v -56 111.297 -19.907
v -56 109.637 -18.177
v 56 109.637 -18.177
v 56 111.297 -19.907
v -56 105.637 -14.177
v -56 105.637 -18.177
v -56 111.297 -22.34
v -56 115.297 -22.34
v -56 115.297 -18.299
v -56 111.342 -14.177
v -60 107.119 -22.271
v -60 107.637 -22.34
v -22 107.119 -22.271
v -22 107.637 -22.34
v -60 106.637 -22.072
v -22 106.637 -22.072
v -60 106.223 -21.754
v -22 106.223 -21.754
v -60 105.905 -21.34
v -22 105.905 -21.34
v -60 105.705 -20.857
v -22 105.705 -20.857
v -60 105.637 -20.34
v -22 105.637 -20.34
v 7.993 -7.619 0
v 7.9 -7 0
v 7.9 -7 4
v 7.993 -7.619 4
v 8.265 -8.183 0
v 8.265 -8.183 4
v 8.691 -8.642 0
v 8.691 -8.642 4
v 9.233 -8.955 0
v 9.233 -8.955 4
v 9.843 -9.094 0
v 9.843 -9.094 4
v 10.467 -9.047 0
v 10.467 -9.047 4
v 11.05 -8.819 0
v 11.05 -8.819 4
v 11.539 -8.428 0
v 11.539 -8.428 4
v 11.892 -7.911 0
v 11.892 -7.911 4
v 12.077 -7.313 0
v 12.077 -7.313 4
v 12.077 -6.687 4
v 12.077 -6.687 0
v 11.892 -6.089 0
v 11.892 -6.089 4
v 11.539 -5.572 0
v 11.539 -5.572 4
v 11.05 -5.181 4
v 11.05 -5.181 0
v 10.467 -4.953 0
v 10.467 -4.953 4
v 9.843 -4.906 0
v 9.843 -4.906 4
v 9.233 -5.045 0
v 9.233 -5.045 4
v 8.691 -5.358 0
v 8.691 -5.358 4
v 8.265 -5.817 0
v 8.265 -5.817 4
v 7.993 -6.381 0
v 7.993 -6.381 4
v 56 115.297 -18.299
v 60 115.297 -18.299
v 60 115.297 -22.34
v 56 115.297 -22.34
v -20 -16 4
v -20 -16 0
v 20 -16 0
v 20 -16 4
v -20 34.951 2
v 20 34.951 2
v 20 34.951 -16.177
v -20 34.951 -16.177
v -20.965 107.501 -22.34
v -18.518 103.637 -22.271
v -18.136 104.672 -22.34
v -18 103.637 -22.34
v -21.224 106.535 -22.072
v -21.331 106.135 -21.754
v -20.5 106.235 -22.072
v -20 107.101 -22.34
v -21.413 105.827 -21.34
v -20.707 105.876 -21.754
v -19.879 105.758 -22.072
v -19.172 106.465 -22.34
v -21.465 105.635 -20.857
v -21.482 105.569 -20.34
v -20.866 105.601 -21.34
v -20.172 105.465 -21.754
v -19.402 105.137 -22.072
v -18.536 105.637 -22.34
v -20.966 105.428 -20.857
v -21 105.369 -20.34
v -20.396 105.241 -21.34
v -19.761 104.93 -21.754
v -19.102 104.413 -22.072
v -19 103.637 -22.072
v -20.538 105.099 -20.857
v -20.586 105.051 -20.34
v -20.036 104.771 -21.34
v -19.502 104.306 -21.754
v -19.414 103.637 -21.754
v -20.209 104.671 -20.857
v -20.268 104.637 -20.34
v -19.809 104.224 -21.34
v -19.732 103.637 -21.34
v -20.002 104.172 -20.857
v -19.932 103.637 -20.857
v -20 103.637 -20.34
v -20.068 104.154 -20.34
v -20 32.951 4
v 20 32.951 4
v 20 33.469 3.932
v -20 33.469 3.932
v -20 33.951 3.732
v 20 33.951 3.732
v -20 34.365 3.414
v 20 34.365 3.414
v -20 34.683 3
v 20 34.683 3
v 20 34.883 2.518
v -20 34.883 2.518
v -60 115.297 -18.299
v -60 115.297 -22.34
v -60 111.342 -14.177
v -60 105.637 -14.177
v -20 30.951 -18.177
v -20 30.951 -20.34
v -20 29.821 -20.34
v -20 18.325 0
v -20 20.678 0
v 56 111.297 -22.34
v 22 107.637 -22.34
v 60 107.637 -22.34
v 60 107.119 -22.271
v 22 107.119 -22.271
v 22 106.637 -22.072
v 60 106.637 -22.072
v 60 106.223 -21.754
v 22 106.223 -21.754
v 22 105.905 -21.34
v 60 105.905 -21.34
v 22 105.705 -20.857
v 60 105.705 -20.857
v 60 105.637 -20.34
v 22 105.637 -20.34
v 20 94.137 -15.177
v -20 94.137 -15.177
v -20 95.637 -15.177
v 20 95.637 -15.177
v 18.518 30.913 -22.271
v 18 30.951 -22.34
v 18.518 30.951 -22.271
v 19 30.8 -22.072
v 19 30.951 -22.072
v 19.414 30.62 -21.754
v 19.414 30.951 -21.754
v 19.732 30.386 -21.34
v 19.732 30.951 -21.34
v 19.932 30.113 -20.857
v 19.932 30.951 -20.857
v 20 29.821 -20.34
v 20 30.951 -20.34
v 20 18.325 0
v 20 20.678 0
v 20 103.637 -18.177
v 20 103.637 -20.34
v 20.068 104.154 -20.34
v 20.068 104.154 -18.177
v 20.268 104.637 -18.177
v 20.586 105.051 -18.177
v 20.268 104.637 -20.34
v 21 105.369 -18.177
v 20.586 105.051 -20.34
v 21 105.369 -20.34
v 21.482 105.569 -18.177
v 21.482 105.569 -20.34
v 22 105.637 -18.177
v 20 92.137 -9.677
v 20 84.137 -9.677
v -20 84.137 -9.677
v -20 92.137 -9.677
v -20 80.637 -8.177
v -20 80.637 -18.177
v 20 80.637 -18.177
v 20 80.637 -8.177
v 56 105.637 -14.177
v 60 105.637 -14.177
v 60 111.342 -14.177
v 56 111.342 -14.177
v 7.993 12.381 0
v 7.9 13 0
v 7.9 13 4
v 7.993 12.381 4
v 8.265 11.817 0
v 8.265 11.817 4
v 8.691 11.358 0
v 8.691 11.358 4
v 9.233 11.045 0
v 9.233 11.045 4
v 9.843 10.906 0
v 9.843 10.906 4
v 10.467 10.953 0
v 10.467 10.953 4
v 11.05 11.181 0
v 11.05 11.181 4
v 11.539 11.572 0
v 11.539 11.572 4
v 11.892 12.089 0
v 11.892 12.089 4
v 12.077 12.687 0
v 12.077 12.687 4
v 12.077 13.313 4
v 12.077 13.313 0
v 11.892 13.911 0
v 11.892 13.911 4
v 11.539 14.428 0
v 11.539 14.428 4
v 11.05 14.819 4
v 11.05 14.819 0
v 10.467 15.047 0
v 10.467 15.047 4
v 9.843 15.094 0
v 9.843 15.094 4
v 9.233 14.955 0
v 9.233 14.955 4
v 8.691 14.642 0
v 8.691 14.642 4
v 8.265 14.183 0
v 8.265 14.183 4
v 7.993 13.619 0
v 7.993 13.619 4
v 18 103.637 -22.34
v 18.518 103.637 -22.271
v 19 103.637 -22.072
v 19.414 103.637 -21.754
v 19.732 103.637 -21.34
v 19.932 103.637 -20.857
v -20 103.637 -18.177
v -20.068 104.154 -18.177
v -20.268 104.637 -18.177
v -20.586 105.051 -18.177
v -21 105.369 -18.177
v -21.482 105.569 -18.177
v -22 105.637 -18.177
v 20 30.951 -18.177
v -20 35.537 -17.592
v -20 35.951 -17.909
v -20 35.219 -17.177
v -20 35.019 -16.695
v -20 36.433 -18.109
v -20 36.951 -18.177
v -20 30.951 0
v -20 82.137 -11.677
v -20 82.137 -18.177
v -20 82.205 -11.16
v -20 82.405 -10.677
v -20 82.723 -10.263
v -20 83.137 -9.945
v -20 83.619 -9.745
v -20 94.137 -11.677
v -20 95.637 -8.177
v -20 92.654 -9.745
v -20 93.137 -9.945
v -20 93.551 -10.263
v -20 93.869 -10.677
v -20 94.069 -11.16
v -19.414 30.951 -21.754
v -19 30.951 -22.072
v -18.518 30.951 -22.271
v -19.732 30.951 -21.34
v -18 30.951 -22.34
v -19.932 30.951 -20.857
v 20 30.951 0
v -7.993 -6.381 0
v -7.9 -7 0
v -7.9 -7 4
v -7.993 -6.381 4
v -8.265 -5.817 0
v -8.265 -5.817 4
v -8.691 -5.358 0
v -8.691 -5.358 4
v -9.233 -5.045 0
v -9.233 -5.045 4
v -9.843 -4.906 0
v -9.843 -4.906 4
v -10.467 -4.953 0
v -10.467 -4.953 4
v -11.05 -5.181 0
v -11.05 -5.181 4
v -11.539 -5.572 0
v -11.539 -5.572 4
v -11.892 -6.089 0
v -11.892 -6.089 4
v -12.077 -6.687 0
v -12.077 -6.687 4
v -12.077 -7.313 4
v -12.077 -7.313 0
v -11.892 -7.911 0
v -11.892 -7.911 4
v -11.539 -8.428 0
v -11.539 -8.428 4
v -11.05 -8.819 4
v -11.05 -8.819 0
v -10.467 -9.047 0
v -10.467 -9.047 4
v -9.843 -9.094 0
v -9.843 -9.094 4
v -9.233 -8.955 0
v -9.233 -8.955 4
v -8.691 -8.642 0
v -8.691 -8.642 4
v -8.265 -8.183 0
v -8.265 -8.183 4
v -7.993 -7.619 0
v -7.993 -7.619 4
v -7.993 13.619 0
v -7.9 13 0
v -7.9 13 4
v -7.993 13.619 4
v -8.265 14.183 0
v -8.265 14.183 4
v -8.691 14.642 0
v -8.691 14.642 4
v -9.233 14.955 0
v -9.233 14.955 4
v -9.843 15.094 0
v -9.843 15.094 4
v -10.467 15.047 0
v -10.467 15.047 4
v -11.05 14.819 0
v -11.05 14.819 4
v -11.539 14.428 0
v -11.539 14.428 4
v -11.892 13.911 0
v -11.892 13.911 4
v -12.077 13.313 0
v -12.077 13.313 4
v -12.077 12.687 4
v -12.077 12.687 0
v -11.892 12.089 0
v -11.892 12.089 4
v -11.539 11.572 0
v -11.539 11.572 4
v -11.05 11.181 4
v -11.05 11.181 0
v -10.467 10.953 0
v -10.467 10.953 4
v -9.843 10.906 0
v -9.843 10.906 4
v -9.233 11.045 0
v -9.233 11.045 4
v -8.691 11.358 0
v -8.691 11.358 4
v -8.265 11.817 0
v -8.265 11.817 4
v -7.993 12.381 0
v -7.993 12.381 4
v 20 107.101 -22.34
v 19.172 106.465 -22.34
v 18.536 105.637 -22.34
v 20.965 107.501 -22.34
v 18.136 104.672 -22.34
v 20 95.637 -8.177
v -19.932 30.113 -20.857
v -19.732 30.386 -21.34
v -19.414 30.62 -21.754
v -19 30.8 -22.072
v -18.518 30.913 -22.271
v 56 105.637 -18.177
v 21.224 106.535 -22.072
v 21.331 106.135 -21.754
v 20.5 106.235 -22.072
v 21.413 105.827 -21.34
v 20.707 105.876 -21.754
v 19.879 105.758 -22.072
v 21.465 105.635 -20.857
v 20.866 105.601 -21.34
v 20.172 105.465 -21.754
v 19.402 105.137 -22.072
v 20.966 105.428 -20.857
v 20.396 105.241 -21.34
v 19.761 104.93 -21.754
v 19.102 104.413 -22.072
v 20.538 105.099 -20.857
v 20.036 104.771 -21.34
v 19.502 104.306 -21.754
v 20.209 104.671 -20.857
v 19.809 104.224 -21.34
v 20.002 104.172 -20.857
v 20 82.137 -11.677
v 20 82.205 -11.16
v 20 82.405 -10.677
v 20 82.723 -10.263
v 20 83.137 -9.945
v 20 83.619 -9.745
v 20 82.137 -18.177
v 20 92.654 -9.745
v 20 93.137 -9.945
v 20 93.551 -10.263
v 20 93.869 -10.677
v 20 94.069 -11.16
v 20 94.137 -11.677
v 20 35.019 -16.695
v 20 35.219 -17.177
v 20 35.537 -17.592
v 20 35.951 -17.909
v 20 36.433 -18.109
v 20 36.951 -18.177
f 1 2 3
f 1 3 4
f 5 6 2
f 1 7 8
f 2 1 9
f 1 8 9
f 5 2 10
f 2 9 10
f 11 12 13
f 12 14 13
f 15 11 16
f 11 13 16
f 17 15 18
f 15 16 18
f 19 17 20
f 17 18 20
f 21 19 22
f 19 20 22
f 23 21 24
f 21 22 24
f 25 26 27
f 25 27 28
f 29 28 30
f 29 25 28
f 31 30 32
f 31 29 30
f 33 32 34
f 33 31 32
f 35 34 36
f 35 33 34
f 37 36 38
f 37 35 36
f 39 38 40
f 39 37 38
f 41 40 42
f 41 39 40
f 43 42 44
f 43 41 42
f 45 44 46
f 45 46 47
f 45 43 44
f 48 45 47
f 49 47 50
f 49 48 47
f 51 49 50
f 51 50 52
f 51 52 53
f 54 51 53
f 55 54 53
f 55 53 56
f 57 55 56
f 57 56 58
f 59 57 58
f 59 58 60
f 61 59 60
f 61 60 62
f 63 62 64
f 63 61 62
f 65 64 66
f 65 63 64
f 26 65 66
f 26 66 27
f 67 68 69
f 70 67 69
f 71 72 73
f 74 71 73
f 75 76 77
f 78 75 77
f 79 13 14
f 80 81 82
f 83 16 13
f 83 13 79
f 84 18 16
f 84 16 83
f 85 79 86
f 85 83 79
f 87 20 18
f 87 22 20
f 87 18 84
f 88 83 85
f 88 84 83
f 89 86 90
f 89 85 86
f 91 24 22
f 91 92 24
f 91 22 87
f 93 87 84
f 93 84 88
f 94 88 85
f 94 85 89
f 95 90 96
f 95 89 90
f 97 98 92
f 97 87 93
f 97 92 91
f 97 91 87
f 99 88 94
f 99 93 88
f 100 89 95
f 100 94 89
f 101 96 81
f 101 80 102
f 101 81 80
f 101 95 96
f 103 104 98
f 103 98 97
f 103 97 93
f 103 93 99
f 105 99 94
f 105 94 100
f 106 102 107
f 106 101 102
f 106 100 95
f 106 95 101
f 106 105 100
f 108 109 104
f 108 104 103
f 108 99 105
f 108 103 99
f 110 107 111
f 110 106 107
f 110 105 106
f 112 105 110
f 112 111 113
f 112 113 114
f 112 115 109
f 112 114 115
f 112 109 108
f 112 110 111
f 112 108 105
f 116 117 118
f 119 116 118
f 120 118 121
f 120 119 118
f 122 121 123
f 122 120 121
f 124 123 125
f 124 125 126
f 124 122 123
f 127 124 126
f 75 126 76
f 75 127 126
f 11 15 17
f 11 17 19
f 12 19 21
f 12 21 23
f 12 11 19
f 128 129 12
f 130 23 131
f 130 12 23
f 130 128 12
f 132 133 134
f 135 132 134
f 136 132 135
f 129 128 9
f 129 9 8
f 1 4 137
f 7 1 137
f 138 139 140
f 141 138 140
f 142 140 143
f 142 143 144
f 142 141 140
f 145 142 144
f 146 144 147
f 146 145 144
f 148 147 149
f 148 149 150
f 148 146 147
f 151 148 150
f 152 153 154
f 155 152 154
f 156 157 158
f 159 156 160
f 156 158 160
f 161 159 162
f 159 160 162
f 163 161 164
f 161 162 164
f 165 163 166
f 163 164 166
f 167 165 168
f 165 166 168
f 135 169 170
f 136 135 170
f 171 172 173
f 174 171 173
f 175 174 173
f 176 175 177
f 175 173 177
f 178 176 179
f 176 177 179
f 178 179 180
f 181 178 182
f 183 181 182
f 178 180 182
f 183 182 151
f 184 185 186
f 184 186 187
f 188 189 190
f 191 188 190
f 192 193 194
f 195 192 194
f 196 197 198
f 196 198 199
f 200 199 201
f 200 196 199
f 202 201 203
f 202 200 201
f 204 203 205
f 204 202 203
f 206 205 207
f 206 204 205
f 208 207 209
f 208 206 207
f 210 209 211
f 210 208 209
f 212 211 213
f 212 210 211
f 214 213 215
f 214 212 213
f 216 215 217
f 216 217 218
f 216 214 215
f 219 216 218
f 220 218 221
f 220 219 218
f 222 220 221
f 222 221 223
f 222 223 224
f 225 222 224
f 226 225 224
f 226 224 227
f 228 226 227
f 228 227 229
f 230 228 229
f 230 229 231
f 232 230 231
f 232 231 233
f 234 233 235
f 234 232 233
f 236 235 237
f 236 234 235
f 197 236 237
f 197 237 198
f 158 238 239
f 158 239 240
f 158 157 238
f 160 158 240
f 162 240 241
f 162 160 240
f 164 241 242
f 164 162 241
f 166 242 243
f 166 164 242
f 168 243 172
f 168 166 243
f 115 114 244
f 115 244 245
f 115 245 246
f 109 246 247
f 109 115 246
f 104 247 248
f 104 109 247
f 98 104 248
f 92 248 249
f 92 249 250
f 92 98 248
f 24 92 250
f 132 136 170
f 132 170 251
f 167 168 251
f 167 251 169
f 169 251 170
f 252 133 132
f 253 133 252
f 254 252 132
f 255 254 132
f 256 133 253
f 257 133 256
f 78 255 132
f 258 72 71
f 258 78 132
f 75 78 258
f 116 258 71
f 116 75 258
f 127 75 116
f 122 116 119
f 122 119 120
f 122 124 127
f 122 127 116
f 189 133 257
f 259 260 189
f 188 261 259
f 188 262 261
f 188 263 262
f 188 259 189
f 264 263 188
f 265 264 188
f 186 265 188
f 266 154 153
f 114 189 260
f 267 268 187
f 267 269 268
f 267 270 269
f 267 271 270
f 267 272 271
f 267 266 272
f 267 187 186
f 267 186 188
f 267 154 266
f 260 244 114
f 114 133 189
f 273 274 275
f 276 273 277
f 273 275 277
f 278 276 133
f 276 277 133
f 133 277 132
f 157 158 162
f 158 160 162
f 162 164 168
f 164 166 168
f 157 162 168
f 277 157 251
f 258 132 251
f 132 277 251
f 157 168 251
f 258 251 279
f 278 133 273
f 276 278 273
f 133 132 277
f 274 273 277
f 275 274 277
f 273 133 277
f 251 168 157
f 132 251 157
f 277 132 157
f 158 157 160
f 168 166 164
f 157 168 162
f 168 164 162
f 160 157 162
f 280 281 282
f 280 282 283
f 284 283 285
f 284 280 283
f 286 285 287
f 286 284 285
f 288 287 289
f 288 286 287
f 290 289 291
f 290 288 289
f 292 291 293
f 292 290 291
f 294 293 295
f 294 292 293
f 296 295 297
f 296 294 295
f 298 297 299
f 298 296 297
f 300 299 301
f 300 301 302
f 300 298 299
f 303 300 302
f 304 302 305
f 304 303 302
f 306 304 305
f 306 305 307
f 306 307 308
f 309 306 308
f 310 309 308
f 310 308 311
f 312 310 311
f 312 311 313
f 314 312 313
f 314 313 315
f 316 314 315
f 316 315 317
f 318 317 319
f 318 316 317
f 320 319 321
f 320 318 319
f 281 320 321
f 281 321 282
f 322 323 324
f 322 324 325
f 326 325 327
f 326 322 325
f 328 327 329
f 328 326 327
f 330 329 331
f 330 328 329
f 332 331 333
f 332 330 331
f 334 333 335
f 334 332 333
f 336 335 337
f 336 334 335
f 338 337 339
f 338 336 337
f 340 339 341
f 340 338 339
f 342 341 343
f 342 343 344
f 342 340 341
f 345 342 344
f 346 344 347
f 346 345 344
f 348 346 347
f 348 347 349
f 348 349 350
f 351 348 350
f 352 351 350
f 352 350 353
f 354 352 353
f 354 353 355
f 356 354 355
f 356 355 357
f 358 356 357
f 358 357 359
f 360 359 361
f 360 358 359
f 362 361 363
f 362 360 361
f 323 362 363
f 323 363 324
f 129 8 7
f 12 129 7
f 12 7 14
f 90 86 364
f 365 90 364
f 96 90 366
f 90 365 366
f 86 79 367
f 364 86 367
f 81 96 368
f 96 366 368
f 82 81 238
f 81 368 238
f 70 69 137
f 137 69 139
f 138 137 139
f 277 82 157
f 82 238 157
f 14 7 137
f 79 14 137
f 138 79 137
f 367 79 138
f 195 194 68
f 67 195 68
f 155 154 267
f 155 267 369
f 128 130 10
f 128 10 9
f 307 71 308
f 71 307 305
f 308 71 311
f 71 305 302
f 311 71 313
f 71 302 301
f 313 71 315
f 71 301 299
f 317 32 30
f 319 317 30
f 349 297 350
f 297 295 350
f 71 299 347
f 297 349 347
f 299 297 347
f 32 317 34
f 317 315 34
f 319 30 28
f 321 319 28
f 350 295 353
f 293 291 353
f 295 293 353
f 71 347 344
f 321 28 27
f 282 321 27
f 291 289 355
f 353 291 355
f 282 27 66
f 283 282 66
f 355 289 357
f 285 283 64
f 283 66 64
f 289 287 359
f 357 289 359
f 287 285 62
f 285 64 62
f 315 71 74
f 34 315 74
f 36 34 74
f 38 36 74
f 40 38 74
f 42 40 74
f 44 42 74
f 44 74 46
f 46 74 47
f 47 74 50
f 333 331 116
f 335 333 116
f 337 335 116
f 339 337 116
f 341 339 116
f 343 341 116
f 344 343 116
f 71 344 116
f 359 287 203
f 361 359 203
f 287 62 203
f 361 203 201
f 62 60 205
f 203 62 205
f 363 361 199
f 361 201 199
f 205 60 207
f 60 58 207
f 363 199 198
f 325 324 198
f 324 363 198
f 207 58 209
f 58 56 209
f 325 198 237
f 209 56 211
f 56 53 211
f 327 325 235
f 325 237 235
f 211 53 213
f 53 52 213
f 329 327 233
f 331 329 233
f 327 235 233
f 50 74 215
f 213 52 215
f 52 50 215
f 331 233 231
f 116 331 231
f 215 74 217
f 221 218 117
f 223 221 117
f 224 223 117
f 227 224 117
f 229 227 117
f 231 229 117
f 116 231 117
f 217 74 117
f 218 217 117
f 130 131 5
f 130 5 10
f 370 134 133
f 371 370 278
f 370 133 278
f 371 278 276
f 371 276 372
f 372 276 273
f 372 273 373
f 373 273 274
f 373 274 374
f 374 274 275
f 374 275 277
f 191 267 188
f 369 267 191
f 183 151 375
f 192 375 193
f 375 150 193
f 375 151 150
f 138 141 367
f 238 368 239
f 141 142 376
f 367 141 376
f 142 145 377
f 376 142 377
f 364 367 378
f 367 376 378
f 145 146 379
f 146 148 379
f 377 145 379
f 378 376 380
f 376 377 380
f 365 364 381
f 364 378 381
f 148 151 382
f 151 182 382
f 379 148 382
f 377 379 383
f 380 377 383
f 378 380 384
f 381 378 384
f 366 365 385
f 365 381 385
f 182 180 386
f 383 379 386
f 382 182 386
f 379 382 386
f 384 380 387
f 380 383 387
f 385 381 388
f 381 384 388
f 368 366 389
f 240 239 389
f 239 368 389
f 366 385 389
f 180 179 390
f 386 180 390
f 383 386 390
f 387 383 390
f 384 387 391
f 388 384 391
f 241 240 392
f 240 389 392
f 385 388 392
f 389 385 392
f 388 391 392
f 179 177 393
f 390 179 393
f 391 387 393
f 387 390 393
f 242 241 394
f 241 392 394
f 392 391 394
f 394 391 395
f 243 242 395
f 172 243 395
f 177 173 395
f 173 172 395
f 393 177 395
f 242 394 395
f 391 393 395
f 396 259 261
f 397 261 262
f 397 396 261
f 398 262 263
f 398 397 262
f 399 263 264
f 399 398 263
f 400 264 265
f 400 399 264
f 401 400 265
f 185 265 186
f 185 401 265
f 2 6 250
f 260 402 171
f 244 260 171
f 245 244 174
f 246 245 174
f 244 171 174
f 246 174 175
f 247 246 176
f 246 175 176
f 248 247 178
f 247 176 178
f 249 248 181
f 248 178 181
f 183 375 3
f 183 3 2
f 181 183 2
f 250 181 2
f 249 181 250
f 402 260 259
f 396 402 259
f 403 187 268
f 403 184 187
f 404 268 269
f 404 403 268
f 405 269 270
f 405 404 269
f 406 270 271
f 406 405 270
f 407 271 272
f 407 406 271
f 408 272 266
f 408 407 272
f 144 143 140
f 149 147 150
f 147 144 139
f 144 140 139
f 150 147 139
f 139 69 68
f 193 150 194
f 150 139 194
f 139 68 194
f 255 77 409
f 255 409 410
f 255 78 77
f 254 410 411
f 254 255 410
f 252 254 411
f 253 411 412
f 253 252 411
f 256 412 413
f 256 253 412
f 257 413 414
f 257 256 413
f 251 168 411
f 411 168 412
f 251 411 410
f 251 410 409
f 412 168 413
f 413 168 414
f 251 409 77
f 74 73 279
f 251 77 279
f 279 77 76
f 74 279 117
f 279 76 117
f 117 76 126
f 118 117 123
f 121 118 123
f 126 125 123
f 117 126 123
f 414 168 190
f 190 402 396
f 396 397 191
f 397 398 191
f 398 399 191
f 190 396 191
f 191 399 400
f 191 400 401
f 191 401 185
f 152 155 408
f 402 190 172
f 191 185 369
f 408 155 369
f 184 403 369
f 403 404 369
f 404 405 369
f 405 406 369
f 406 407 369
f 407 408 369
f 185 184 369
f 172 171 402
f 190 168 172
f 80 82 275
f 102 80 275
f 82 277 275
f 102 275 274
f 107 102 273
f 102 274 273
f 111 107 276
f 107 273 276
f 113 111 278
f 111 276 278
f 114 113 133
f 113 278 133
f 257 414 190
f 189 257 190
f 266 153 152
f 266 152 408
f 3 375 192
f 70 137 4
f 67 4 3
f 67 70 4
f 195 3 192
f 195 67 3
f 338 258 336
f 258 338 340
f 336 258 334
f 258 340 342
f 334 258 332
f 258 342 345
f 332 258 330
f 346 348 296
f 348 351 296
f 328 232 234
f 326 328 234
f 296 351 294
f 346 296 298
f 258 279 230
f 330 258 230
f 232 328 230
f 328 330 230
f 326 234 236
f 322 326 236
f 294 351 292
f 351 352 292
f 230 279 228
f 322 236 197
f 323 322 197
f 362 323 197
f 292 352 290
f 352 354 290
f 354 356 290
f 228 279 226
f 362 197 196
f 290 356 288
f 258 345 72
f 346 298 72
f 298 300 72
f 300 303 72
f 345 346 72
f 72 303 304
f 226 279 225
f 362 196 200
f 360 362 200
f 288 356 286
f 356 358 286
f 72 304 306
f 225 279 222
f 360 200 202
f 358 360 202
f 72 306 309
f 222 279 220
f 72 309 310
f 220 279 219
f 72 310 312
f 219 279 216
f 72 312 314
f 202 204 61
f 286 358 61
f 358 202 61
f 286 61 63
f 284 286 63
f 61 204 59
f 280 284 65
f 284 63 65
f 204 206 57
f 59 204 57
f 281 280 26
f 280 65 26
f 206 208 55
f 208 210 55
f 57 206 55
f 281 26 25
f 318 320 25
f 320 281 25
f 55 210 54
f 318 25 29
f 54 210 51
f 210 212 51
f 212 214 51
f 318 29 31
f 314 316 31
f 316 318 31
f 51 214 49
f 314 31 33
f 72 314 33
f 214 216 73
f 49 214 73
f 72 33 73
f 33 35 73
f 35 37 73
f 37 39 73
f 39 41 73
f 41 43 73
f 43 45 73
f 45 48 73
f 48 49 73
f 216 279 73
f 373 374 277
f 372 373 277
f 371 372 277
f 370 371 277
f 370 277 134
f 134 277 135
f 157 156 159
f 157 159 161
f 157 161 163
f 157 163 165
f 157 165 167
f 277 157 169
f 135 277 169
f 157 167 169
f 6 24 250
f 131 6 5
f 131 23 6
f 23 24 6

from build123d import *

# Parameters (mm, degrees)
SKETCH_1_W          = 40
SKETCH_1_H          = 35
SKETCH_1_R          = 2.1
EXTRUDE_1_DEPTH     = 4
EXTRUDE_2_DEPTH     = 40
SKETCH_4_W          = 40
SKETCH_4_H          = 4.162308774
EXTRUDE_3_DEPTH     = 56.94
CUT_EXTRUDE_1_DEPTH = 121.357980229
EXTRUDE_4_DEPTH     = 60
EXTRUDE_5_DEPTH     = 4
EXTRUDE_6_DEPTH     = 4
SKETCH_10_W         = 40
SKETCH_10_H         = 15
EXTRUDE_7_DEPTH     = 10
SKETCH_11_W         = 8.5
SKETCH_11_H         = 12
CUT_EXTRUDE_2_DEPTH = 143.100028239
SKETCH_12_W         = 3
SKETCH_12_H         = 1.5
CUT_EXTRUDE_3_DEPTH = 143.100028239
CUT_EXTRUDE_4_DEPTH = 143.100028239
CUT_EXTRUDE_5_DEPTH = 143.100028239
EXTRUDE_10_DEPTH    = 40
SKETCH_19_W         = 4.162308774
SKETCH_19_H         = 5.255395785
CUT_EXTRUDE_6_DEPTH = 143.100028239
EXTRUDE_11_DEPTH    = 40
FILLET_2_R          = 2
FILLET_3_R          = 2
FILLET_4_R          = 2
FILLET_5_R          = 2
CUT_EXTRUDE_7_DEPTH = 106.892734597
FILLET_6_R          = 2


with BuildPart() as part:
    # 草图1 → 凸台-拉伸1 (new body)
    with BuildSketch(Plane.XY):
        with Locations((0, 1.5)):
            Rectangle(SKETCH_1_W, SKETCH_1_H)
        with Locations((-10, 13)):
            Circle(SKETCH_1_R, mode=Mode.SUBTRACT)
        with Locations((-10, -7)):
            Circle(SKETCH_1_R, mode=Mode.SUBTRACT)
        with Locations(Location((10, -7, 0), (0, 0, 180))):
            Circle(SKETCH_1_R, mode=Mode.SUBTRACT)
        with Locations(Location((10, 13, 0), (0, 0, 180))):
            Circle(SKETCH_1_R, mode=Mode.SUBTRACT)
    extrude(amount=EXTRUDE_1_DEPTH)

    # 草图3 → 凸台-拉伸2 (add)
    with BuildSketch(Plane(origin=(20, 0, 0), x_dir=(0, 0, -1), z_dir=(1, 0, 0))):
        Polygon((0, 23.010957881), (-4, 23.010957881), (-4, 19), (0, 19), (22.339641279, 25.6956455), (22.339641279, 54.356827593), (18.177332505, 54.356827593), (18.177332505, 28.459074665), align=None)
    extrude(amount=-EXTRUDE_2_DEPTH)

    # 草图4 → 凸台-拉伸3 (add)
    with BuildSketch(Plane(origin=(0, 54.356827593, 0), x_dir=(1, 0, 0), z_dir=(0, 1, 0))):
        with Locations((0, 20.258486892)):
            Rectangle(SKETCH_4_W, SKETCH_4_H)
    extrude(amount=EXTRUDE_3_DEPTH)

    # 草图5 → 切除-拉伸1 (cut, through all)
    with BuildSketch(Plane(origin=(20, 0, 0), x_dir=(0, 0, -1), z_dir=(1, 0, 0))):
        Polygon((19.907332505, 111.296827593), (18.177332505, 109.636827593), (18.177332505, 111.296827593), align=None)
    extrude(amount=-CUT_EXTRUDE_1_DEPTH, mode=Mode.SUBTRACT)

    # 草图6 → 凸台-拉伸4 (add, symmetric)
    with BuildSketch(Plane(origin=(0, 0, 0), x_dir=(0, 0, -1), z_dir=(1, 0, 0))):
        Polygon((19.907332505, 111.296827593), (22.339641279, 111.296827593), (22.339641279, 105.636827593), (18.177332505, 105.636827593), (18.177332505, 109.636827593), align=None)
    extrude(amount=EXTRUDE_4_DEPTH, both=True)

    # 草图7 → 凸台-拉伸5 (add)
    with BuildSketch(Plane(origin=(60, 0, 0), x_dir=(0, 0, -1), z_dir=(1, 0, 0))):
        Polygon((22.339641279, 115.296827593), (22.339641279, 105.636827593), (14.177332505, 105.636827593), (14.177332505, 111.342267985), (18.29865065, 115.296827593), align=None)
    extrude(amount=-EXTRUDE_5_DEPTH)

    # 草图9 → 凸台-拉伸6 (add)
    with BuildSketch(Plane.ZY.offset(60)):
        Polygon((-22.339641279, 115.296827593), (-22.339641279, 105.636827593), (-14.177332505, 105.636827593), (-14.177332505, 111.342267985), (-18.29865065, 115.296827593), align=None)
    extrude(amount=-EXTRUDE_6_DEPTH)

    # 草图10 → 凸台-拉伸7 (add)
    with BuildSketch(Plane.XY.offset(-18.177332505)):
        with Locations((0, 88.136827593)):
            Rectangle(SKETCH_10_W, SKETCH_10_H)
    extrude(amount=EXTRUDE_7_DEPTH)

    # 草图11 → 切除-拉伸2 (cut, through all)
    with BuildSketch(Plane.ZY.offset(20)):
        with Locations((-13.927332505, 88.136827593)):
            Rectangle(SKETCH_11_W, SKETCH_11_H)
    extrude(amount=-CUT_EXTRUDE_2_DEPTH, mode=Mode.SUBTRACT)

    # 草图12 → 切除-拉伸3 (cut, through all)
    with BuildSketch(Plane.ZY.offset(20)):
        with Locations((-16.677332505, 94.886827593)):
            Rectangle(SKETCH_12_W, SKETCH_12_H)
    extrude(amount=-CUT_EXTRUDE_3_DEPTH, mode=Mode.SUBTRACT)

    # 草图13 → 切除-拉伸4 (cut, through all)
    with BuildSketch(Plane(origin=(20, 0, 0), x_dir=(0, 0, -1), z_dir=(1, 0, 0))):
        Polygon((0, 23.010957881), (0, 19), (18.177332505, 19), (18.177332505, 24.448116784), (18.177332505, 28.459074665), (0, 28.459074665), align=None)
    extrude(amount=-CUT_EXTRUDE_4_DEPTH, mode=Mode.SUBTRACT)


with BuildPart() as cut_extrude_4_piece_1:
    # of the separate pieces the step leaves, piece 1, a body of its own (cut_extrude_4_pieces)
    add(part.part.solids().sort_by_distance((-20, 24.448116784, -18.177332505))[0])

    # 草图14 → 切除-拉伸5 (cut, through all)
    with BuildSketch(Plane(origin=(20, 0, 0), x_dir=(0, 0, -1), z_dir=(1, 0, 0))):
        Polygon((22.339641279, 25.6956455), (18.177332505, 25.6956455), (18.177332505, 24.448116784), align=None)
    extrude(amount=-CUT_EXTRUDE_5_DEPTH, mode=Mode.SUBTRACT)



with BuildPart() as cut_extrude_4_piece_2:
    # of the separate pieces the step leaves, piece 2, a body of its own (cut_extrude_4_pieces)
    add(part.part.solids().sort_by_distance((-20, -16, 0))[0])


with BuildPart() as cut_extrude_4_piece_1_1:
    add(cut_extrude_4_piece_1.part)

    add(cut_extrude_4_piece_2.part)  # 凸台-拉伸10 merges 切除-拉伸4 piece 2
    # 草图18 → 凸台-拉伸10 (add)
    with BuildSketch(Plane(origin=(20, 0, 0), x_dir=(0, 0, -1), z_dir=(1, 0, 0))):
        Polygon((-4, 23.010957881), (-4, 34.951041285), (22.339641279, 34.951041285), (22.339641279, 30.951041285), (0, 30.951041285), (0, 23.010957881), align=None)
    extrude(amount=-EXTRUDE_10_DEPTH)

    # 草图19 → 切除-拉伸6 (cut, through all)
    with BuildSketch(Plane(origin=(20, 0, 0), x_dir=(0, 0, -1), z_dir=(1, 0, 0))):
        with Locations((20.258486892, 28.323343392)):
            Rectangle(SKETCH_19_W, SKETCH_19_H)
    extrude(amount=-CUT_EXTRUDE_6_DEPTH, mode=Mode.SUBTRACT)

    # 圆角2
    fillet_2_edges = [cut_extrude_4_piece_1_1.edges().sort_by_distance(p)[0] for p in [
        (0, 34.951041285, 4),
    ]]
    fillet(fillet_2_edges, radius=FILLET_2_R)

    # 圆角3
    fillet_3_edges = [cut_extrude_4_piece_1_1.edges().sort_by_distance(p)[0] for p in [
        (0, 34.951041285, -18.177332505),
    ]]
    fillet(fillet_3_edges, radius=FILLET_3_R)

    # 圆角4
    fillet_4_edges = [cut_extrude_4_piece_1_1.edges().sort_by_distance(p)[0] for p in [
        (20, 105.636827593, -20.258486892),
        (-20, 105.636827593, -20.258486892),
    ]]
    fillet(fillet_4_edges, radius=FILLET_4_R)

    # 圆角5
    fillet_5_edges = [cut_extrude_4_piece_1_1.edges().sort_by_distance(p)[0] for p in [
        (41, 105.636827593, -22.339641279),
        (20, 67.293934439, -22.339641279),
        (-20, 67.293934439, -22.339641279),
        (-41, 105.636827593, -22.339641279),
        (-20.585786438, 105.051041156, -22.339641279),
        (20.585786438, 105.051041156, -22.339641279),
    ]]
    fillet(fillet_5_edges, radius=FILLET_5_R)

    # 圆角6
    fillet_6_edges = [cut_extrude_4_piece_1_1.edges().sort_by_distance(p)[0] for p in [
        (0, 94.136827593, -9.677332505),
        (0, 82.136827593, -9.677332505),
    ]]
    fillet(fillet_6_edges, radius=FILLET_6_R)


with BuildPart() as body_2:
    # 草图20 → 凸台-拉伸11 (new body)
    with BuildSketch(Plane(origin=(20, 0, 0), x_dir=(0, 0, -1), z_dir=(1, 0, 0))):
        Polygon((22.339641279, 30.951041285), (0, 18.325146666), (0, 20.677595897), (18.177332505, 30.951041285), align=None)
    extrude(amount=-EXTRUDE_11_DEPTH)

    # 草图21 → 切除-拉伸7 (cut, through all)
    with BuildSketch(Plane(origin=(0, 30.951041285, 0), x_dir=(1, 0, 0), z_dir=(0, 1, 0))):
        with BuildLine():
            Line((-20, 22.339641279), (-20, 20.339641279))
            ThreePointArc((-20, 20.339641279), (-19.414213562, 21.753854841), (-18, 22.339641279))
            Line((-18, 22.339641279), (-20, 22.339641279))
        make_face()
        with BuildLine():
            Line((20, 22.339641279), (18, 22.339641279))
            ThreePointArc((18, 22.339641279), (19.414213562, 21.753854841), (20, 20.339641279))
            Line((20, 20.339641279), (20, 22.339641279))
        make_face()
    extrude(amount=-CUT_EXTRUDE_7_DEPTH, mode=Mode.SUBTRACT)


solid = Compound([cut_extrude_4_piece_1_1.part, body_2.part])
